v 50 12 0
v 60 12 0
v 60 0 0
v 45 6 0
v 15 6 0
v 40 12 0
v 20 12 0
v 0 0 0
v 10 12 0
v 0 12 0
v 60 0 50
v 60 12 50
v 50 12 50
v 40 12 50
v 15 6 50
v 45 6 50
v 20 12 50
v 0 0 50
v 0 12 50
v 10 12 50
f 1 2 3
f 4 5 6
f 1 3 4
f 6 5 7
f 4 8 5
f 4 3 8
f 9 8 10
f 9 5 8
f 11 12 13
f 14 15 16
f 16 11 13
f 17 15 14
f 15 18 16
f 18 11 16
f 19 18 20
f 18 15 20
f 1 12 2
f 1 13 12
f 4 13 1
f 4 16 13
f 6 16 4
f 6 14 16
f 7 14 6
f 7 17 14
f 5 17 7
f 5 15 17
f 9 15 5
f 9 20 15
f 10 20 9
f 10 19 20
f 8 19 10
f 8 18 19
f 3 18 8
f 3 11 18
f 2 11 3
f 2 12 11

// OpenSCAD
$fn = 32;

// ----------------------------------------------------------------------
// V guide rail: doublev, 60 mm wide
// ----------------------------------------------------------------------

// --- parameters (mm) ---
rail_w = 60;              // rail width, X
base_t = 12;              // base plate thickness
v_depth = 6;              // V feature depth / height
v_half_w = 10;            // half width of the V at the base face
plate_t = 50;             // rail length, Z (the extrusion height)
groove_off = 15;          // offset of each groove from the centreline

centre_x = rail_w / 2;  // rail centreline
groove_a = centre_x - groove_off;  // axis of the first groove
groove_b = centre_x + groove_off;  // axis of the second groove

profile = [[0, 0], [60, 0], [60, 12], [50, 12], [45, 6], [40, 12], [20, 12], [15, 6], [10, 12], [0, 12]];  // primary outline, 10 points, counter clockwise

// --- the one profile operation ---
linear_extrude(height = plate_t) polygon(points = profile);
